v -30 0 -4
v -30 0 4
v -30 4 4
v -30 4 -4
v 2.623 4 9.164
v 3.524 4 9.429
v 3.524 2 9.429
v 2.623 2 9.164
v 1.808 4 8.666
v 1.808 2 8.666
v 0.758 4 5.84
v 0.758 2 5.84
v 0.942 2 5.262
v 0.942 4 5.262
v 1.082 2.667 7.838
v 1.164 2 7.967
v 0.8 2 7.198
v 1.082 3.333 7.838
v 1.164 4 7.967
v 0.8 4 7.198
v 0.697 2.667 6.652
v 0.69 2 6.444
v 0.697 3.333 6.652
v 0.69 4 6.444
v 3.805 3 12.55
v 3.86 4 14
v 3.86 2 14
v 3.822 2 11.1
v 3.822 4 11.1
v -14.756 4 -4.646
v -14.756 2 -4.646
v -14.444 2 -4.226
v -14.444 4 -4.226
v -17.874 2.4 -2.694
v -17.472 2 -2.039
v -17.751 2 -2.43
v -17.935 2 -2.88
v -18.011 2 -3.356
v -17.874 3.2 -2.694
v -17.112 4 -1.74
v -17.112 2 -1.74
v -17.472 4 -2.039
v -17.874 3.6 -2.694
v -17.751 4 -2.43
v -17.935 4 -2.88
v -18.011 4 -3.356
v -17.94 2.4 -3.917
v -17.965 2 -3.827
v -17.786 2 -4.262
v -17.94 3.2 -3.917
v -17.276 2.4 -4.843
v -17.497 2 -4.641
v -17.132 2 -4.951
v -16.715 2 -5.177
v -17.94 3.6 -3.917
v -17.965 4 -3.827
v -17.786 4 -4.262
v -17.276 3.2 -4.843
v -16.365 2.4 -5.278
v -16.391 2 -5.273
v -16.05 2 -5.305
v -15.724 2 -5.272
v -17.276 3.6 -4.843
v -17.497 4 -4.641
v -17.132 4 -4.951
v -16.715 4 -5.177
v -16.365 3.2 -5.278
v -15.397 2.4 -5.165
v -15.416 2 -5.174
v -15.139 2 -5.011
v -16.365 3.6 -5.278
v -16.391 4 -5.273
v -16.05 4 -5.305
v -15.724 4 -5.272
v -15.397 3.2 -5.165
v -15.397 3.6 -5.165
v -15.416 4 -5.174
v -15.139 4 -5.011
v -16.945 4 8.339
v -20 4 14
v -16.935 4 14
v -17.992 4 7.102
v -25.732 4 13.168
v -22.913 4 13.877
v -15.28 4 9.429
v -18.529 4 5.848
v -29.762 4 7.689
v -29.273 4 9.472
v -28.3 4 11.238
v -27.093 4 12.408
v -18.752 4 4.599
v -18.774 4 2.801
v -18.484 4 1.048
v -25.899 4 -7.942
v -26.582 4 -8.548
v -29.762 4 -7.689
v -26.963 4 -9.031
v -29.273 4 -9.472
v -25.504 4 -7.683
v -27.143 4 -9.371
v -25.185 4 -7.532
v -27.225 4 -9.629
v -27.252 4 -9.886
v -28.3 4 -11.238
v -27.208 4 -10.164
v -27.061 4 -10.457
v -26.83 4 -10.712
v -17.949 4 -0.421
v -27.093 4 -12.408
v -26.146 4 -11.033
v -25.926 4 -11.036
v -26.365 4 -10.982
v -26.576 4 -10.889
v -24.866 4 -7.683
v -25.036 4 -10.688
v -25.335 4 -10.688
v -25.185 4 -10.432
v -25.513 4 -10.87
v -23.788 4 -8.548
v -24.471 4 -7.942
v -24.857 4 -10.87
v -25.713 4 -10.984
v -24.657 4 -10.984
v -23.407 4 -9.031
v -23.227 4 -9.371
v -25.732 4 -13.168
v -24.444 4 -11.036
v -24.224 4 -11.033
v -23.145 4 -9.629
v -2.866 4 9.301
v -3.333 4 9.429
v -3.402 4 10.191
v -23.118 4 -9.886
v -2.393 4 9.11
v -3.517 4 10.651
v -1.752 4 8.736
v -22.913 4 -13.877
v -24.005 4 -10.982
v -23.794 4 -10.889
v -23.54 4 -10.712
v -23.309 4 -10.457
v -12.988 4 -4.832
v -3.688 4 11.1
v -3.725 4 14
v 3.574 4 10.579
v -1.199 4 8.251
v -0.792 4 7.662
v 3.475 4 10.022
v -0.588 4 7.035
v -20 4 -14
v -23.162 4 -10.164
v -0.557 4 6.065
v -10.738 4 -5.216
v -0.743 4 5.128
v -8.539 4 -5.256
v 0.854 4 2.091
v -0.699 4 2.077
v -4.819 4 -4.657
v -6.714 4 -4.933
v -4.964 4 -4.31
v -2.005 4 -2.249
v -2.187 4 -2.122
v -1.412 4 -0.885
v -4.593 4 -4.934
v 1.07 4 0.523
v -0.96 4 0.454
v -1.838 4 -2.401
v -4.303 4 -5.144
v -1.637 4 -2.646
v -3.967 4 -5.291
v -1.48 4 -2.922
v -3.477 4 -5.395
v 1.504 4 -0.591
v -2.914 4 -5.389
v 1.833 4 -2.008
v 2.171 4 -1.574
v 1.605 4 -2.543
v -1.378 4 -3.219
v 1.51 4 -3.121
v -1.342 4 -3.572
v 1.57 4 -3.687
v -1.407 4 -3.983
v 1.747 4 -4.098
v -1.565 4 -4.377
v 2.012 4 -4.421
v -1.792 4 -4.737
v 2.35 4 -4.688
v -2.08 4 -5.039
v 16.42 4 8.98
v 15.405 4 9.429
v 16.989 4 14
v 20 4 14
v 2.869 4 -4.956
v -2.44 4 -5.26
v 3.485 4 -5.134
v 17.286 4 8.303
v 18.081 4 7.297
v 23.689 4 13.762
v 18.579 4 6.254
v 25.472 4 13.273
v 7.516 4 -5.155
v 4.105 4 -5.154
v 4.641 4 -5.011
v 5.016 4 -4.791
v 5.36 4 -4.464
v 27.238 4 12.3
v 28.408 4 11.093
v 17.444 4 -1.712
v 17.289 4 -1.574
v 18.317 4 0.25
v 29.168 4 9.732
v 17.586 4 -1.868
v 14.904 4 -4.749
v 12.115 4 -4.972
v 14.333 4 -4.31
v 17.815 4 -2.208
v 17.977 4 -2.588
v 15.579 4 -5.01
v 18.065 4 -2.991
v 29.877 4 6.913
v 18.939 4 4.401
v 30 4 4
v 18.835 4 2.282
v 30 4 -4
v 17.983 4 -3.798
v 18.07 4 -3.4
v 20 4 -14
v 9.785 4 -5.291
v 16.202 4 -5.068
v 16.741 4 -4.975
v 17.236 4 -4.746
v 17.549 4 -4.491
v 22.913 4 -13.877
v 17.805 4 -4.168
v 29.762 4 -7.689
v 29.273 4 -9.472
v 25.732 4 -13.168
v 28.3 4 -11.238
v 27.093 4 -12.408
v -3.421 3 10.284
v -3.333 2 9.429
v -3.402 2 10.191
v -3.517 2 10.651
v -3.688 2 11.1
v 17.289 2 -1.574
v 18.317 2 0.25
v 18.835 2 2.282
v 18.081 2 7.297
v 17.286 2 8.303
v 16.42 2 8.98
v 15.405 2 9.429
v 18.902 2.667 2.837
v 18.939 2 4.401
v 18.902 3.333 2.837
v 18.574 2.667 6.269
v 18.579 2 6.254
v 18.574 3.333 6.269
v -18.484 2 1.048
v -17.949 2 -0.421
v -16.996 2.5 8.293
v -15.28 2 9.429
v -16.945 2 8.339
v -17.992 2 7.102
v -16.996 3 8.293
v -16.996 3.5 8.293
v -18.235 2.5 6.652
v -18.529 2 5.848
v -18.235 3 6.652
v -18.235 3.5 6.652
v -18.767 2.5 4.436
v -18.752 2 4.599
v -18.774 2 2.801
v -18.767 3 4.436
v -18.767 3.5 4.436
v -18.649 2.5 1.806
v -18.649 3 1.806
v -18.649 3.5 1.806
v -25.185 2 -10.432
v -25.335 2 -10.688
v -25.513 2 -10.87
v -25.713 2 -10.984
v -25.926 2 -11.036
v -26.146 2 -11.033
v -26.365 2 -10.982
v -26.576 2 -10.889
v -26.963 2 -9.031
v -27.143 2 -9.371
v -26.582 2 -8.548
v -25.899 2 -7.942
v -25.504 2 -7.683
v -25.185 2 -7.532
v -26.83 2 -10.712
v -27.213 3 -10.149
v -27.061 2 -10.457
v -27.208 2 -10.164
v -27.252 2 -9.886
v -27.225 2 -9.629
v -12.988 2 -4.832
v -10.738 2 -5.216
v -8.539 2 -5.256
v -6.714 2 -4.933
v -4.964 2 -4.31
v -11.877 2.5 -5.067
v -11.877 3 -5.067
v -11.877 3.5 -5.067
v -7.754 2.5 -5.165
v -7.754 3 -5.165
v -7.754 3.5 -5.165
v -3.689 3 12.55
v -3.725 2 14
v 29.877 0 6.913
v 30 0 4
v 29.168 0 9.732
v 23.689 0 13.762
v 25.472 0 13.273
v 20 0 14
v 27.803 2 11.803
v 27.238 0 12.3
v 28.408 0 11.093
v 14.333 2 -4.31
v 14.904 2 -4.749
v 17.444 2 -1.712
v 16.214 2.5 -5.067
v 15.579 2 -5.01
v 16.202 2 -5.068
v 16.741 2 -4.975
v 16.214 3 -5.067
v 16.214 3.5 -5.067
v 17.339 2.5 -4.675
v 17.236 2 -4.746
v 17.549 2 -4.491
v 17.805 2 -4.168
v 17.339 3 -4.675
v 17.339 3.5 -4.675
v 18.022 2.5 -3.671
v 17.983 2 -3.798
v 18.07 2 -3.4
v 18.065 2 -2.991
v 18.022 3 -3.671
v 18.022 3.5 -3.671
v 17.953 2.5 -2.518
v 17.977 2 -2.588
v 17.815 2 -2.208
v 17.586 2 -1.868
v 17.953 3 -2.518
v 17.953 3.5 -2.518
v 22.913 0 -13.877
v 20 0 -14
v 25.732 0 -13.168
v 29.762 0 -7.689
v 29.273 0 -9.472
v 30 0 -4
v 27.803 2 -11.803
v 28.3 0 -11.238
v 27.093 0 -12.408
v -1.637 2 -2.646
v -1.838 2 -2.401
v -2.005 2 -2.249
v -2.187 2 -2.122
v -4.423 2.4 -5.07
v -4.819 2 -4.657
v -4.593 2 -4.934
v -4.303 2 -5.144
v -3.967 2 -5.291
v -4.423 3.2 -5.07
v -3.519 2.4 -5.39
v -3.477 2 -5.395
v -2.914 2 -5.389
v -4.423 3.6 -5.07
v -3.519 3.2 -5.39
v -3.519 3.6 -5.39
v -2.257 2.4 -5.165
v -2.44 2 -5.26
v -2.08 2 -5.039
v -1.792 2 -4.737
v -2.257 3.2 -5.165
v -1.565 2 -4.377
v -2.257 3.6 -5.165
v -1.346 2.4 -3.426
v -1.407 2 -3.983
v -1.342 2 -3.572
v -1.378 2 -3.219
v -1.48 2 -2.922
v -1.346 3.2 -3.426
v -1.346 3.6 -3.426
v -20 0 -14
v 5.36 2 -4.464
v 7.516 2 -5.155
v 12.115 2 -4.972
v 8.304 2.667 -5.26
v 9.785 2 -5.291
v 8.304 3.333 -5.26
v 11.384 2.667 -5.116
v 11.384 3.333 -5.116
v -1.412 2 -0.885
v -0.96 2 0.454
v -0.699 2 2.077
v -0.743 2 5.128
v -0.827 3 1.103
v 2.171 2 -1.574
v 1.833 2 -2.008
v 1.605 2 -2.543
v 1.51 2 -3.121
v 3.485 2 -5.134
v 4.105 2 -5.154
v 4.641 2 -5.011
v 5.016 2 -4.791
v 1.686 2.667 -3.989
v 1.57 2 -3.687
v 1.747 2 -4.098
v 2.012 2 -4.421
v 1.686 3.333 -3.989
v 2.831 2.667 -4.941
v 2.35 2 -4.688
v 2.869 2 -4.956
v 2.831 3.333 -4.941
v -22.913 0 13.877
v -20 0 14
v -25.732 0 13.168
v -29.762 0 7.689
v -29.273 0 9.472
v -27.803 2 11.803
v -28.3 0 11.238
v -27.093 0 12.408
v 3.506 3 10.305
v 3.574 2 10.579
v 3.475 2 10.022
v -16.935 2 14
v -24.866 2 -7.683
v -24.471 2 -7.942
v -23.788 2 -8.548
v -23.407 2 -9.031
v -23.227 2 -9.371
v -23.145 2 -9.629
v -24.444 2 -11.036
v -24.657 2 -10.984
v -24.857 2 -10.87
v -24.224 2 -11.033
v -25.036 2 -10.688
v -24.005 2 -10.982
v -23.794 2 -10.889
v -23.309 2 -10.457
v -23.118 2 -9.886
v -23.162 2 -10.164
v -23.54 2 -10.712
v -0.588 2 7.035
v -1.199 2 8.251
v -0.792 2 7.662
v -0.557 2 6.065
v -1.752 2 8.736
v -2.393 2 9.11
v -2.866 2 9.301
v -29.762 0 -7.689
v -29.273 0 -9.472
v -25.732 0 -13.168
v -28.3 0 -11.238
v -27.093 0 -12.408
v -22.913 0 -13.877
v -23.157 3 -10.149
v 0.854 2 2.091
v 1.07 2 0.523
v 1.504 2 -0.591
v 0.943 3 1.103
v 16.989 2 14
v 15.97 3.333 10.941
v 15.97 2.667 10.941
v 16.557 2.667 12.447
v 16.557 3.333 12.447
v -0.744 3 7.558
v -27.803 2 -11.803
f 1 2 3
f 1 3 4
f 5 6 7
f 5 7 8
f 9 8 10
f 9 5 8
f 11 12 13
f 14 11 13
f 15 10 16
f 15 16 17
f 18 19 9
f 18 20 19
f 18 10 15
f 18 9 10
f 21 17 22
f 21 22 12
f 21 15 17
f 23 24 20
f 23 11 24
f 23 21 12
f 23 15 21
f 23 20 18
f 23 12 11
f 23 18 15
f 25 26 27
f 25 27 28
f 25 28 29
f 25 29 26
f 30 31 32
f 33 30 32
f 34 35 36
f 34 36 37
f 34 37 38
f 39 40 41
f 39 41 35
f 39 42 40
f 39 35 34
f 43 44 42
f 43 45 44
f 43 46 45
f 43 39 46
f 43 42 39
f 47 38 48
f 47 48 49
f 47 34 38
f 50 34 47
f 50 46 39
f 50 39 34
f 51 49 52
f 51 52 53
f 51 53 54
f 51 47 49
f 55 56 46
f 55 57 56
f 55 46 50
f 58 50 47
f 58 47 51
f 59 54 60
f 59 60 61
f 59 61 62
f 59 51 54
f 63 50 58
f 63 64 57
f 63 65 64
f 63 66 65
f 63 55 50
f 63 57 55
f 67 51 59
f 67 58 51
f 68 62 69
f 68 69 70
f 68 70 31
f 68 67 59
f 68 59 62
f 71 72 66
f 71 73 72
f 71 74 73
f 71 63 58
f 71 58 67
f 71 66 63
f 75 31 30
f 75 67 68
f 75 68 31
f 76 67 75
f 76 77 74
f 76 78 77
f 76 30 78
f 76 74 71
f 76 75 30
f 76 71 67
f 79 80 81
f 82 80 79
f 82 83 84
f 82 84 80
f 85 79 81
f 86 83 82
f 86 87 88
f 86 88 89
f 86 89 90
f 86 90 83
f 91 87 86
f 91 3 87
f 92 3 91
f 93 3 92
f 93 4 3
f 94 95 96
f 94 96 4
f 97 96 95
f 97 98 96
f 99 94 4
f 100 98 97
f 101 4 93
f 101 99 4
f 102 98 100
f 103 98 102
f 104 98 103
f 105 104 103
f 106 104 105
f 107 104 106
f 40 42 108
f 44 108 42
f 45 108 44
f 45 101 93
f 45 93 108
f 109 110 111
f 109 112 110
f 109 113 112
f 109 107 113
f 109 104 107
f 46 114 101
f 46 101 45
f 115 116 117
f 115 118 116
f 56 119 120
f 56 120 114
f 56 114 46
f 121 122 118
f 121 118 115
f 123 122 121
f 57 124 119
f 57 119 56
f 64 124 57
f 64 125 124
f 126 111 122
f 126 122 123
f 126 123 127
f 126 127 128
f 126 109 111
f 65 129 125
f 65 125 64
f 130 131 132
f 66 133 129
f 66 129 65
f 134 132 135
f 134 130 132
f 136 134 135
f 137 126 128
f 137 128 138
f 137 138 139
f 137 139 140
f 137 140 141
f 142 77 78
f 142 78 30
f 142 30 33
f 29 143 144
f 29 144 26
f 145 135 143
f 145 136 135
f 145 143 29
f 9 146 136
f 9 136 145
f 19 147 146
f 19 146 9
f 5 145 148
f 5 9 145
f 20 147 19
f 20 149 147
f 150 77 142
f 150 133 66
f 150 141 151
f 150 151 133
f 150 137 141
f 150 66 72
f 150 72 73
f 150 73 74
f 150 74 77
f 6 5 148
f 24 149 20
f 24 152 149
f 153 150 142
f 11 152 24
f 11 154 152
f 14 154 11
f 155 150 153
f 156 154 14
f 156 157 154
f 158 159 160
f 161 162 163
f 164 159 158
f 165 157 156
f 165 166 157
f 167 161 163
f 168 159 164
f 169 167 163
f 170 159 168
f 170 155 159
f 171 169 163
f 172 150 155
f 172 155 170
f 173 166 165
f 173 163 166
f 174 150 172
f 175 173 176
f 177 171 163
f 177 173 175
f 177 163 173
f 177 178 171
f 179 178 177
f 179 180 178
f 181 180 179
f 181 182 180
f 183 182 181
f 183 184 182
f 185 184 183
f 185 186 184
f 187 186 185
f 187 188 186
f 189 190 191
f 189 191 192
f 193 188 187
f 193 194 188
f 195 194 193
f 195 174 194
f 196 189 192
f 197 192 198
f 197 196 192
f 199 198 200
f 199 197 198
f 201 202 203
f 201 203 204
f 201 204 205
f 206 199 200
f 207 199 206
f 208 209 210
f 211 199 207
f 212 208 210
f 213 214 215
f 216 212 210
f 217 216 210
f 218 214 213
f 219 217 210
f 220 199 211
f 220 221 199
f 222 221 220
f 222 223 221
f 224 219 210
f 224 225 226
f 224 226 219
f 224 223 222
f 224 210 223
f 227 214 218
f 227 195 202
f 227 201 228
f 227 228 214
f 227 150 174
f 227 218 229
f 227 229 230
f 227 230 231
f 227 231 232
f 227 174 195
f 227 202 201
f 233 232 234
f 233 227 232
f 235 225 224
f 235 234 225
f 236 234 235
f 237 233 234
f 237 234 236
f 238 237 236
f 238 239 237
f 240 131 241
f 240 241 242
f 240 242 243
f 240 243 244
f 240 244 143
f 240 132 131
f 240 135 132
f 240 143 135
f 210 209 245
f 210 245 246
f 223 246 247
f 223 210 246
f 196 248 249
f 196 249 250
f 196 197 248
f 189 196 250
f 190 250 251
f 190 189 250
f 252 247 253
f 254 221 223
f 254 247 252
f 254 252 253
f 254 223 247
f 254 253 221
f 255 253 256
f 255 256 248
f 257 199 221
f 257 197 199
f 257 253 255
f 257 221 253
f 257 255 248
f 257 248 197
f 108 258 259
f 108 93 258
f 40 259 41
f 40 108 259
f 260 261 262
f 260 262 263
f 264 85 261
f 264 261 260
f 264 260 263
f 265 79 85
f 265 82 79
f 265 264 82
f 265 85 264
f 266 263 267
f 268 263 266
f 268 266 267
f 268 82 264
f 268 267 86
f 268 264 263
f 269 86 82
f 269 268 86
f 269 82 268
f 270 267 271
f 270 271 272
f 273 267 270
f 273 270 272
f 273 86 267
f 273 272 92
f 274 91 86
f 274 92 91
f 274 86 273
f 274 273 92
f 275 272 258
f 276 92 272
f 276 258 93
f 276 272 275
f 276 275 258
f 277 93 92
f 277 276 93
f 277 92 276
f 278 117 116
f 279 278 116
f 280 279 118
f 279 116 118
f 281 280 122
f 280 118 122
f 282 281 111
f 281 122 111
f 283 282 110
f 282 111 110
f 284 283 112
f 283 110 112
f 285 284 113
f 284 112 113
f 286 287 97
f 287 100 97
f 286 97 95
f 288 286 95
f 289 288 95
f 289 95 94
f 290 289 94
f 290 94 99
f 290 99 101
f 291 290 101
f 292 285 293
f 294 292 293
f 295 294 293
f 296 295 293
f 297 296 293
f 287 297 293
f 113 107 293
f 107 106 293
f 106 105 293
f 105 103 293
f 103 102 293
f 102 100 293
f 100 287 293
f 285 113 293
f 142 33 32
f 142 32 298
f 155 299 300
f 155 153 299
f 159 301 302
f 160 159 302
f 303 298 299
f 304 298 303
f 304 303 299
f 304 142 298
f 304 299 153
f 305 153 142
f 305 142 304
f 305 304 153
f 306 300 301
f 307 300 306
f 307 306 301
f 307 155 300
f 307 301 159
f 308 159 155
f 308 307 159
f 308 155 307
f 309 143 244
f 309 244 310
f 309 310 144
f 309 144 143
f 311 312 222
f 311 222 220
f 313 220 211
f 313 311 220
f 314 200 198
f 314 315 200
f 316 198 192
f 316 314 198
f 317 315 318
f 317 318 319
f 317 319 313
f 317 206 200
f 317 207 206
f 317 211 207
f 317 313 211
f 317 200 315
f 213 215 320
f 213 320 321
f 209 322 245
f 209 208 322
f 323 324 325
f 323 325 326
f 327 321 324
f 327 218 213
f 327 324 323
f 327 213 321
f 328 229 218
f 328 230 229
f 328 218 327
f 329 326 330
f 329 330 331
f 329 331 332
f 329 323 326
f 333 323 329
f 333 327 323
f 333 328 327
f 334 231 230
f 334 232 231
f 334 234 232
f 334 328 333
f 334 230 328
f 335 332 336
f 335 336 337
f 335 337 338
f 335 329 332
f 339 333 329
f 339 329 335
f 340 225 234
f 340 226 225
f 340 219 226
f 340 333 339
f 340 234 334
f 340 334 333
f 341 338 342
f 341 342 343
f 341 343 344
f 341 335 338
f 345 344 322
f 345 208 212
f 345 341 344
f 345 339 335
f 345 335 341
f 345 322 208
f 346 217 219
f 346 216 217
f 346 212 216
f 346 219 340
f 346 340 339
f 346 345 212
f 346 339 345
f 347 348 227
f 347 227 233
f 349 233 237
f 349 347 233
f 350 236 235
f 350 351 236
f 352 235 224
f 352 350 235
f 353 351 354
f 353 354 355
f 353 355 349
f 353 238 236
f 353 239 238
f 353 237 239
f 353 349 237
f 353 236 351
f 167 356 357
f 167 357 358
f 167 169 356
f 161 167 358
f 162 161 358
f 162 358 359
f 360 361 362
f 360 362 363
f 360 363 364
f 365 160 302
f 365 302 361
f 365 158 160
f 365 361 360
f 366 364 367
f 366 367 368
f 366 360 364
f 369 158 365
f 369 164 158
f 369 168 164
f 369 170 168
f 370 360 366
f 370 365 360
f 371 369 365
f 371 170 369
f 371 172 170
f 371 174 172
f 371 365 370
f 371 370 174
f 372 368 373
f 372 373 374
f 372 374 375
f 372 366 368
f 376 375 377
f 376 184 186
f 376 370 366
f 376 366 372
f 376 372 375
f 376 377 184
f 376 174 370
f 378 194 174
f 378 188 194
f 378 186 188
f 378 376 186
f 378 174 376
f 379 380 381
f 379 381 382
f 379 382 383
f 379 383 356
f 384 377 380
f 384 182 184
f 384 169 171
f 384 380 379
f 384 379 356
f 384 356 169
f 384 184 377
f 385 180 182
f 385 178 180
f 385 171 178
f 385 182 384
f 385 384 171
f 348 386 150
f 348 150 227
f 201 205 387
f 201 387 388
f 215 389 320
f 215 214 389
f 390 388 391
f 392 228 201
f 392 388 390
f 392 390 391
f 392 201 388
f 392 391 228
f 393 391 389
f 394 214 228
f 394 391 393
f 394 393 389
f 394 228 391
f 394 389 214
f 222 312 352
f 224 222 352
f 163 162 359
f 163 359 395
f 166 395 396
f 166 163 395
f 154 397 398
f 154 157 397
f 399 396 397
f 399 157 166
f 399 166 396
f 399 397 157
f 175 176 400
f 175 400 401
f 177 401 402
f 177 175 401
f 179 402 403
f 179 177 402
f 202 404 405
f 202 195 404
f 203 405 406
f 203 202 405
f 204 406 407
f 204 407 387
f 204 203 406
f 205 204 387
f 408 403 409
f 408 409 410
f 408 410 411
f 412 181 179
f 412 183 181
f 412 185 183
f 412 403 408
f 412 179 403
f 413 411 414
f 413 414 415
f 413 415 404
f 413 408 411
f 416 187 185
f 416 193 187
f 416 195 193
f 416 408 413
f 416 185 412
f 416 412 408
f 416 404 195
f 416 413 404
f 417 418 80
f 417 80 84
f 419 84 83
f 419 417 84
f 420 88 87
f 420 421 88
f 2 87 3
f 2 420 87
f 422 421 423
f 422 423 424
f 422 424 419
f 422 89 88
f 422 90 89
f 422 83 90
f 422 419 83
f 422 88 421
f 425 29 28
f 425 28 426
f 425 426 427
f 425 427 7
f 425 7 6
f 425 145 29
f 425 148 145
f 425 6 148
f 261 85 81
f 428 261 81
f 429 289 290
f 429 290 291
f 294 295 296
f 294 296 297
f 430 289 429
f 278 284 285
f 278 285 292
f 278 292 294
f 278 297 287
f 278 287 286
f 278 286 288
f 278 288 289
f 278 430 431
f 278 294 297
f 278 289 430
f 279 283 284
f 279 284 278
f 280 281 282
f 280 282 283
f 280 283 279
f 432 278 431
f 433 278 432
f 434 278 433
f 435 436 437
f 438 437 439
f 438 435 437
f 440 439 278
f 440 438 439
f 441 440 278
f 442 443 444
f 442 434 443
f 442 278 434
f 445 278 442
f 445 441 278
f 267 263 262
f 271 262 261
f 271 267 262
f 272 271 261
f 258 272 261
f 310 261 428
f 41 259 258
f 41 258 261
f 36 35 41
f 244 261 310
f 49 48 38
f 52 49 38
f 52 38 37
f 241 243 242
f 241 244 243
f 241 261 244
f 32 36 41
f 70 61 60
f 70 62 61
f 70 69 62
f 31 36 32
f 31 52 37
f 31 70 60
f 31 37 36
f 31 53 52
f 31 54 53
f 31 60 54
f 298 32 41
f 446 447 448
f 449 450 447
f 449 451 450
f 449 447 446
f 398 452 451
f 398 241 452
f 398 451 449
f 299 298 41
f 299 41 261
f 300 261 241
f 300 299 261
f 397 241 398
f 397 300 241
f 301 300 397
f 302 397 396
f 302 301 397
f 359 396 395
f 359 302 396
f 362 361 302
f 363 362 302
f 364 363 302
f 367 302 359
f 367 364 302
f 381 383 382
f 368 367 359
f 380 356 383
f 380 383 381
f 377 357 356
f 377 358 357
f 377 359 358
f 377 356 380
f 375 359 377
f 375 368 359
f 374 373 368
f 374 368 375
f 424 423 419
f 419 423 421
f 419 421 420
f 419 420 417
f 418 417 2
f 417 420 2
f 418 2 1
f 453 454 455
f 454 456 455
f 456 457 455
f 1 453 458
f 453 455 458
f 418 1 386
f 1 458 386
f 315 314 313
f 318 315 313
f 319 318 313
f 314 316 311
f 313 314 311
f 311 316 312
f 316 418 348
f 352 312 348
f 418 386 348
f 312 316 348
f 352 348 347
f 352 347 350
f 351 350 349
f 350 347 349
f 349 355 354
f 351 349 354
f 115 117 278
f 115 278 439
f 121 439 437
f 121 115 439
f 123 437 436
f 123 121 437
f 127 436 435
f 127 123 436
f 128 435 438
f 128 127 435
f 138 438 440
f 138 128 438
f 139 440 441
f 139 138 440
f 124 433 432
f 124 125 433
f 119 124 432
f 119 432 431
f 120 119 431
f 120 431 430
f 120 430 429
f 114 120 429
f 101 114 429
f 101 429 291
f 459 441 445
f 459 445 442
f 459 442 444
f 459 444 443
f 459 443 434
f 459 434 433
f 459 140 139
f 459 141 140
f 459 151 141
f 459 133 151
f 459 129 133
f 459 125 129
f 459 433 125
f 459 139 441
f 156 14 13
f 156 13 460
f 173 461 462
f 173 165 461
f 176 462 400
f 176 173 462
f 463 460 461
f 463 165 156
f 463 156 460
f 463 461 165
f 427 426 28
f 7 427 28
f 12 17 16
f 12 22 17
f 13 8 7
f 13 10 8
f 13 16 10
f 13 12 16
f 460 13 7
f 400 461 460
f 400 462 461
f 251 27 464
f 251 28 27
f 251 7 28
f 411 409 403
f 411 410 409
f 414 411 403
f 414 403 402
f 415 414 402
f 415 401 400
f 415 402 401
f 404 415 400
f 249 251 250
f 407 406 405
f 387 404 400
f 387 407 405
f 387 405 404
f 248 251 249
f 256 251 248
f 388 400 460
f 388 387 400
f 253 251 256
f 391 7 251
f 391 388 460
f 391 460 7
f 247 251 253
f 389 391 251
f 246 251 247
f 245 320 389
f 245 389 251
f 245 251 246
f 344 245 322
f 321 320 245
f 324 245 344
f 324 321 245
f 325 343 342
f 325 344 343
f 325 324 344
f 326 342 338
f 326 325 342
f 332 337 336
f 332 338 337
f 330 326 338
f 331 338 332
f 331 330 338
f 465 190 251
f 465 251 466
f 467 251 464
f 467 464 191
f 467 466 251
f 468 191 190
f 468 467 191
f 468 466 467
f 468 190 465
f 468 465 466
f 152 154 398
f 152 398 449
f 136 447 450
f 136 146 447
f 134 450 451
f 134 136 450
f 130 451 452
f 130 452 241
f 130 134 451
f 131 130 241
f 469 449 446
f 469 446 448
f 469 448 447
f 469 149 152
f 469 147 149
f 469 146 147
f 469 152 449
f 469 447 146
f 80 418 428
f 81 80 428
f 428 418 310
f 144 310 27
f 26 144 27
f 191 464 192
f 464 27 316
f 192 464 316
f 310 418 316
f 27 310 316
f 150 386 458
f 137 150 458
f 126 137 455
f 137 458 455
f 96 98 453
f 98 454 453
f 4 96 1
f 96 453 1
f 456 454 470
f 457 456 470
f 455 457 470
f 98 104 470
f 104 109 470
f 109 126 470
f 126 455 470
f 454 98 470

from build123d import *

# Parameters (mm, degrees)
SKETCH_1_W          = 60
SKETCH_1_H          = 28
EXTRUDE_1_DEPTH     = 4
FILLET_1_SIZE       = 10
CUT_EXTRUDE_1_DEPTH = 2


with BuildPart() as part:
    # 草图1 → 凸台-拉伸1 (new body)
    with BuildSketch(Plane(origin=(0, 0, 0), x_dir=(1, 0, 0), z_dir=(0, 1, 0))):
        Rectangle(SKETCH_1_W, SKETCH_1_H)
    extrude(amount=EXTRUDE_1_DEPTH)

    # 圆角1
    # a fillet whose section is not a circle: 10 mm, written as the material it takes off along each edge
    with BuildSketch(Plane(origin=(30, -25, 14), x_dir=(0, 0, -1), z_dir=(0, 1, 0)), Plane(origin=(30, -25, -14), x_dir=(-1, 0, 0), z_dir=(0, 1, 0)), Plane(origin=(-30, -25, 14), x_dir=(1, 0, 0), z_dir=(0, 1, 0))) as fillet_1_piece_1:
        with BuildLine():
            add(Edge.make_bspline([(FILLET_1_SIZE, 0), (FILLET_1_SIZE * 0.831801948466, 0), (FILLET_1_SIZE * 0.663603896932, 0), (FILLET_1_SIZE * 0.292893218813, FILLET_1_SIZE * 0.0716919198361), (FILLET_1_SIZE * 0.0716919198361, FILLET_1_SIZE * 0.292893218813), (0, FILLET_1_SIZE * 0.663603896932), (0, FILLET_1_SIZE * 0.831801948466), (0, FILLET_1_SIZE)], knots=[0, 0, 0, 0, 0, 0, 0.5, 0.5, 1, 1, 1, 1, 1, 1], degree=5))
            Line((0, FILLET_1_SIZE), (0, 0))
            Line((0, 0), (FILLET_1_SIZE, 0))
        make_face()
    extrude(amount=54, mode=Mode.SUBTRACT)
    with BuildSketch(Plane(origin=(-30, -25, -14), x_dir=(1, 0, 0), z_dir=(0, 1, 0))) as fillet_1_piece_2:
        with BuildLine():
            add(Edge.make_bspline([(FILLET_1_SIZE, 0), (FILLET_1_SIZE * 0.831801948466, 0), (FILLET_1_SIZE * 0.663603896932, 0), (FILLET_1_SIZE * 0.292893218813, -FILLET_1_SIZE * 0.0716919198361), (FILLET_1_SIZE * 0.0716919198361, -FILLET_1_SIZE * 0.292893218813), (0, -FILLET_1_SIZE * 0.663603896932), (0, -FILLET_1_SIZE * 0.831801948466), (0, -FILLET_1_SIZE)], knots=[0, 0, 0, 0, 0, 0, 0.5, 0.5, 1, 1, 1, 1, 1, 1], degree=5))
            Line((0, -FILLET_1_SIZE), (0, 0))
            Line((0, 0), (FILLET_1_SIZE, 0))
        make_face()
    extrude(amount=54, mode=Mode.SUBTRACT)

    # 草图2 → 切除-拉伸1 (cut)
    with BuildSketch(Plane(origin=(0, 4, 0), x_dir=(1, 0, 0), z_dir=(0, 1, 0))):
        with BuildLine():
            Line((-16.935076069, -14), (-3.724944257, -14))
            add(Edge.make_bspline(
                [(-3.687819463, -11.10018183), (-3.670837845, -12.550695913), (-3.724944257, -14)],
                knots=[0, 0, 0, 1, 1, 1], degree=2))
            add(Edge.make_bspline(
                [(-3.333312713, -9.429337618), (-3.330795543, -10.302670918), (-3.687819463, -11.10018183)],
                knots=[0, 0, 0, 1, 1, 1], degree=2))
            add(Edge.make_bspline(
                [(-0.742711054, -5.127809832), (-0.519156675, -5.880287043), (-0.292936969, -8.050568721), (-2.341442668, -9.22030854), (-3.333312713, -9.429337618)],
                knots=[0, 0, 0, 0, 0.428917256, 1, 1, 1, 1], degree=3))
            add(Edge.make_bspline(
                [(-2.187125143, 2.12230749), (-1.4106002, 1.204552618), (-0.592489001, -1.244047904), (-0.600668316, -3.791601167), (-0.742711054, -5.127809832)],
                knots=[0, 0, 0, 0, 0.466812094, 1, 1, 1, 1], degree=3))
            add(Edge.make_bspline(
                [(-4.963765819, 4.30996378), (-4.793040938, 4.977205844), (-3.75279166, 5.532669201), (-2.278151789, 5.341305653), (-1.531570873, 4.465738286), (-1.148751049, 3.242289174), (-1.743465674, 2.389914822), (-2.187125143, 2.12230749)],
                knots=[0, 0, 0, 0, 0.278653368, 0.467417998, 0.60771691, 0.765483941, 1, 1, 1, 1], degree=3))
            add(Edge.make_bspline(
                [(-14.443609745, 4.225823154), (-13.661769199, 4.701986871), (-12.07963713, 5.088608477), (-9.80873584, 5.325514917), (-7.438485821, 5.235768859), (-5.859496423, 4.683683956), (-4.963765819, 4.30996378)],
                knots=[0, 0, 0, 0, 0.277671681, 0.493980308, 0.700924653, 1, 1, 1, 1], degree=3))
            add(Edge.make_bspline(
                [(-17.112369797, 1.740167248), (-17.796876509, 2.159176308), (-18.361225861, 3.59646204), (-17.356865882, 4.881210301), (-16.40295998, 5.370009473), (-15.208277597, 5.256104096), (-14.685195355, 4.587656422), (-14.443609745, 4.225823154)],
                knots=[0, 0, 0, 0, 0.353240726, 0.517926677, 0.663976899, 0.804852125, 1, 1, 1, 1], degree=3))
            add(Edge.make_bspline(
                [(-15.280334608, -9.429337618), (-16.497678509, -8.866325433), (-18.294247529, -7.346930593), (-18.872884283, -4.315150537), (-18.745655148, -1.369033801), (-17.944096186, 0.728594057), (-17.112369797, 1.740167248)],
                knots=[0, 0, 0, 0, 0.318174296, 0.494604613, 0.698392994, 1, 1, 1, 1], degree=3))
            Line((-15.280334608, -9.429337618), (-16.935076069, -14))
        make_face()
        with BuildLine():
            Line((3.859545005, -14), (16.989453484, -14))
            add(Edge.make_bspline(
                [(15.404911602, -9.429337618), (15.900430103, -10.960211179), (16.69378742, -12.407476359), (16.989453484, -14)],
                knots=[0, 0, 0, 0, 1, 1, 1, 1], degree=3))
            add(Edge.make_bspline(
                [(17.288668554, 1.574170629), (18.287334611, 0.305452853), (19.081858131, -2.363427448), (18.899603104, -6.766539361), (16.920972519, -8.986056385), (15.404911602, -9.429337618)],
                knots=[0, 0, 0, 0, 0.370985391, 0.64043209, 1, 1, 1, 1], degree=3))
            add(Edge.make_bspline(
                [(14.333173858, 4.30996378), (14.813620622, 4.805305608), (15.919659705, 5.273598818), (17.423209254, 4.783697576), (18.393133704, 3.377287394), (17.886541605, 2.047965808), (17.288668554, 1.574170629)],
                knots=[0, 0, 0, 0, 0.305299637, 0.480890731, 0.659706763, 1, 1, 1, 1], degree=3))
            add(Edge.make_bspline(
                [(5.359934346, 4.464221596), (8.147654076, 5.822153518), (11.537691595, 5.354629666), (14.333173858, 4.30996378)],
                knots=[0, 0, 0, 0, 1, 1, 1, 1], degree=3))
            add(Edge.make_bspline(
                [(2.170811741, 1.574170629), (1.581087403, 2.132858214), (1.138470768, 3.878747123), (3.169357766, 5.317866652), (4.664971625, 5.28325304), (5.359934346, 4.464221596)],
                knots=[0, 0, 0, 0, 0.379311018, 0.599175154, 1, 1, 1, 1], degree=3))
            add(Edge.make_bspline(
                [(0.941523625, -5.262232932), (0.98567745, -3.887367548), (0.523188823, -1.466699515), (1.521155106, 0.830396312), (2.170811741, 1.574170629)],
                knots=[0, 0, 0, 0, 0.583806076, 1, 1, 1, 1], degree=3))
            add(Edge.make_bspline(
                [(3.524384204, -9.429337618), (2.557976333, -9.282877204), (1.192253003, -8.451499296), (0.573882177, -6.601892019), (0.759159881, -5.696024028), (0.941523625, -5.262232932)],
                knots=[0, 0, 0, 0, 0.526961764, 0.748177959, 1, 1, 1, 1], degree=3))
            add(Edge.make_bspline(
                [(3.821968614, -11.10018183), (3.337919448, -10.344678931), (3.524384204, -9.429337618)],
                knots=[0, 0, 0, 1, 1, 1], degree=2))
            add(Edge.make_bspline(
                [(3.859545005, -14), (3.769556535, -12.550344491), (3.821968614, -11.10018183)],
                knots=[0, 0, 0, 1, 1, 1], degree=2))
        make_face()
        with BuildLine():
            add(Edge.make_bspline(
                [(-25.185013425, 10.431735443), (-25.689297318, 11.557258243), (-28.770586094, 10.040399625), (-25.818873431, 7.748418433), (-25.185013425, 7.531774201)],
                knots=[0, 0, 0, 0, 0.419335828, 1, 1, 1, 1], degree=3))
            add(Edge.make_bspline(
                [(-25.185013425, 10.431735443), (-24.680729531, 11.557258243), (-21.599440755, 10.040399625), (-24.551153418, 7.748418433), (-25.185013425, 7.531774201)],
                knots=[0, 0, 0, 0, 0.419335828, 1, 1, 1, 1], degree=3))
        make_face()
    extrude(amount=-CUT_EXTRUDE_1_DEPTH, mode=Mode.SUBTRACT)


solid = part.part
